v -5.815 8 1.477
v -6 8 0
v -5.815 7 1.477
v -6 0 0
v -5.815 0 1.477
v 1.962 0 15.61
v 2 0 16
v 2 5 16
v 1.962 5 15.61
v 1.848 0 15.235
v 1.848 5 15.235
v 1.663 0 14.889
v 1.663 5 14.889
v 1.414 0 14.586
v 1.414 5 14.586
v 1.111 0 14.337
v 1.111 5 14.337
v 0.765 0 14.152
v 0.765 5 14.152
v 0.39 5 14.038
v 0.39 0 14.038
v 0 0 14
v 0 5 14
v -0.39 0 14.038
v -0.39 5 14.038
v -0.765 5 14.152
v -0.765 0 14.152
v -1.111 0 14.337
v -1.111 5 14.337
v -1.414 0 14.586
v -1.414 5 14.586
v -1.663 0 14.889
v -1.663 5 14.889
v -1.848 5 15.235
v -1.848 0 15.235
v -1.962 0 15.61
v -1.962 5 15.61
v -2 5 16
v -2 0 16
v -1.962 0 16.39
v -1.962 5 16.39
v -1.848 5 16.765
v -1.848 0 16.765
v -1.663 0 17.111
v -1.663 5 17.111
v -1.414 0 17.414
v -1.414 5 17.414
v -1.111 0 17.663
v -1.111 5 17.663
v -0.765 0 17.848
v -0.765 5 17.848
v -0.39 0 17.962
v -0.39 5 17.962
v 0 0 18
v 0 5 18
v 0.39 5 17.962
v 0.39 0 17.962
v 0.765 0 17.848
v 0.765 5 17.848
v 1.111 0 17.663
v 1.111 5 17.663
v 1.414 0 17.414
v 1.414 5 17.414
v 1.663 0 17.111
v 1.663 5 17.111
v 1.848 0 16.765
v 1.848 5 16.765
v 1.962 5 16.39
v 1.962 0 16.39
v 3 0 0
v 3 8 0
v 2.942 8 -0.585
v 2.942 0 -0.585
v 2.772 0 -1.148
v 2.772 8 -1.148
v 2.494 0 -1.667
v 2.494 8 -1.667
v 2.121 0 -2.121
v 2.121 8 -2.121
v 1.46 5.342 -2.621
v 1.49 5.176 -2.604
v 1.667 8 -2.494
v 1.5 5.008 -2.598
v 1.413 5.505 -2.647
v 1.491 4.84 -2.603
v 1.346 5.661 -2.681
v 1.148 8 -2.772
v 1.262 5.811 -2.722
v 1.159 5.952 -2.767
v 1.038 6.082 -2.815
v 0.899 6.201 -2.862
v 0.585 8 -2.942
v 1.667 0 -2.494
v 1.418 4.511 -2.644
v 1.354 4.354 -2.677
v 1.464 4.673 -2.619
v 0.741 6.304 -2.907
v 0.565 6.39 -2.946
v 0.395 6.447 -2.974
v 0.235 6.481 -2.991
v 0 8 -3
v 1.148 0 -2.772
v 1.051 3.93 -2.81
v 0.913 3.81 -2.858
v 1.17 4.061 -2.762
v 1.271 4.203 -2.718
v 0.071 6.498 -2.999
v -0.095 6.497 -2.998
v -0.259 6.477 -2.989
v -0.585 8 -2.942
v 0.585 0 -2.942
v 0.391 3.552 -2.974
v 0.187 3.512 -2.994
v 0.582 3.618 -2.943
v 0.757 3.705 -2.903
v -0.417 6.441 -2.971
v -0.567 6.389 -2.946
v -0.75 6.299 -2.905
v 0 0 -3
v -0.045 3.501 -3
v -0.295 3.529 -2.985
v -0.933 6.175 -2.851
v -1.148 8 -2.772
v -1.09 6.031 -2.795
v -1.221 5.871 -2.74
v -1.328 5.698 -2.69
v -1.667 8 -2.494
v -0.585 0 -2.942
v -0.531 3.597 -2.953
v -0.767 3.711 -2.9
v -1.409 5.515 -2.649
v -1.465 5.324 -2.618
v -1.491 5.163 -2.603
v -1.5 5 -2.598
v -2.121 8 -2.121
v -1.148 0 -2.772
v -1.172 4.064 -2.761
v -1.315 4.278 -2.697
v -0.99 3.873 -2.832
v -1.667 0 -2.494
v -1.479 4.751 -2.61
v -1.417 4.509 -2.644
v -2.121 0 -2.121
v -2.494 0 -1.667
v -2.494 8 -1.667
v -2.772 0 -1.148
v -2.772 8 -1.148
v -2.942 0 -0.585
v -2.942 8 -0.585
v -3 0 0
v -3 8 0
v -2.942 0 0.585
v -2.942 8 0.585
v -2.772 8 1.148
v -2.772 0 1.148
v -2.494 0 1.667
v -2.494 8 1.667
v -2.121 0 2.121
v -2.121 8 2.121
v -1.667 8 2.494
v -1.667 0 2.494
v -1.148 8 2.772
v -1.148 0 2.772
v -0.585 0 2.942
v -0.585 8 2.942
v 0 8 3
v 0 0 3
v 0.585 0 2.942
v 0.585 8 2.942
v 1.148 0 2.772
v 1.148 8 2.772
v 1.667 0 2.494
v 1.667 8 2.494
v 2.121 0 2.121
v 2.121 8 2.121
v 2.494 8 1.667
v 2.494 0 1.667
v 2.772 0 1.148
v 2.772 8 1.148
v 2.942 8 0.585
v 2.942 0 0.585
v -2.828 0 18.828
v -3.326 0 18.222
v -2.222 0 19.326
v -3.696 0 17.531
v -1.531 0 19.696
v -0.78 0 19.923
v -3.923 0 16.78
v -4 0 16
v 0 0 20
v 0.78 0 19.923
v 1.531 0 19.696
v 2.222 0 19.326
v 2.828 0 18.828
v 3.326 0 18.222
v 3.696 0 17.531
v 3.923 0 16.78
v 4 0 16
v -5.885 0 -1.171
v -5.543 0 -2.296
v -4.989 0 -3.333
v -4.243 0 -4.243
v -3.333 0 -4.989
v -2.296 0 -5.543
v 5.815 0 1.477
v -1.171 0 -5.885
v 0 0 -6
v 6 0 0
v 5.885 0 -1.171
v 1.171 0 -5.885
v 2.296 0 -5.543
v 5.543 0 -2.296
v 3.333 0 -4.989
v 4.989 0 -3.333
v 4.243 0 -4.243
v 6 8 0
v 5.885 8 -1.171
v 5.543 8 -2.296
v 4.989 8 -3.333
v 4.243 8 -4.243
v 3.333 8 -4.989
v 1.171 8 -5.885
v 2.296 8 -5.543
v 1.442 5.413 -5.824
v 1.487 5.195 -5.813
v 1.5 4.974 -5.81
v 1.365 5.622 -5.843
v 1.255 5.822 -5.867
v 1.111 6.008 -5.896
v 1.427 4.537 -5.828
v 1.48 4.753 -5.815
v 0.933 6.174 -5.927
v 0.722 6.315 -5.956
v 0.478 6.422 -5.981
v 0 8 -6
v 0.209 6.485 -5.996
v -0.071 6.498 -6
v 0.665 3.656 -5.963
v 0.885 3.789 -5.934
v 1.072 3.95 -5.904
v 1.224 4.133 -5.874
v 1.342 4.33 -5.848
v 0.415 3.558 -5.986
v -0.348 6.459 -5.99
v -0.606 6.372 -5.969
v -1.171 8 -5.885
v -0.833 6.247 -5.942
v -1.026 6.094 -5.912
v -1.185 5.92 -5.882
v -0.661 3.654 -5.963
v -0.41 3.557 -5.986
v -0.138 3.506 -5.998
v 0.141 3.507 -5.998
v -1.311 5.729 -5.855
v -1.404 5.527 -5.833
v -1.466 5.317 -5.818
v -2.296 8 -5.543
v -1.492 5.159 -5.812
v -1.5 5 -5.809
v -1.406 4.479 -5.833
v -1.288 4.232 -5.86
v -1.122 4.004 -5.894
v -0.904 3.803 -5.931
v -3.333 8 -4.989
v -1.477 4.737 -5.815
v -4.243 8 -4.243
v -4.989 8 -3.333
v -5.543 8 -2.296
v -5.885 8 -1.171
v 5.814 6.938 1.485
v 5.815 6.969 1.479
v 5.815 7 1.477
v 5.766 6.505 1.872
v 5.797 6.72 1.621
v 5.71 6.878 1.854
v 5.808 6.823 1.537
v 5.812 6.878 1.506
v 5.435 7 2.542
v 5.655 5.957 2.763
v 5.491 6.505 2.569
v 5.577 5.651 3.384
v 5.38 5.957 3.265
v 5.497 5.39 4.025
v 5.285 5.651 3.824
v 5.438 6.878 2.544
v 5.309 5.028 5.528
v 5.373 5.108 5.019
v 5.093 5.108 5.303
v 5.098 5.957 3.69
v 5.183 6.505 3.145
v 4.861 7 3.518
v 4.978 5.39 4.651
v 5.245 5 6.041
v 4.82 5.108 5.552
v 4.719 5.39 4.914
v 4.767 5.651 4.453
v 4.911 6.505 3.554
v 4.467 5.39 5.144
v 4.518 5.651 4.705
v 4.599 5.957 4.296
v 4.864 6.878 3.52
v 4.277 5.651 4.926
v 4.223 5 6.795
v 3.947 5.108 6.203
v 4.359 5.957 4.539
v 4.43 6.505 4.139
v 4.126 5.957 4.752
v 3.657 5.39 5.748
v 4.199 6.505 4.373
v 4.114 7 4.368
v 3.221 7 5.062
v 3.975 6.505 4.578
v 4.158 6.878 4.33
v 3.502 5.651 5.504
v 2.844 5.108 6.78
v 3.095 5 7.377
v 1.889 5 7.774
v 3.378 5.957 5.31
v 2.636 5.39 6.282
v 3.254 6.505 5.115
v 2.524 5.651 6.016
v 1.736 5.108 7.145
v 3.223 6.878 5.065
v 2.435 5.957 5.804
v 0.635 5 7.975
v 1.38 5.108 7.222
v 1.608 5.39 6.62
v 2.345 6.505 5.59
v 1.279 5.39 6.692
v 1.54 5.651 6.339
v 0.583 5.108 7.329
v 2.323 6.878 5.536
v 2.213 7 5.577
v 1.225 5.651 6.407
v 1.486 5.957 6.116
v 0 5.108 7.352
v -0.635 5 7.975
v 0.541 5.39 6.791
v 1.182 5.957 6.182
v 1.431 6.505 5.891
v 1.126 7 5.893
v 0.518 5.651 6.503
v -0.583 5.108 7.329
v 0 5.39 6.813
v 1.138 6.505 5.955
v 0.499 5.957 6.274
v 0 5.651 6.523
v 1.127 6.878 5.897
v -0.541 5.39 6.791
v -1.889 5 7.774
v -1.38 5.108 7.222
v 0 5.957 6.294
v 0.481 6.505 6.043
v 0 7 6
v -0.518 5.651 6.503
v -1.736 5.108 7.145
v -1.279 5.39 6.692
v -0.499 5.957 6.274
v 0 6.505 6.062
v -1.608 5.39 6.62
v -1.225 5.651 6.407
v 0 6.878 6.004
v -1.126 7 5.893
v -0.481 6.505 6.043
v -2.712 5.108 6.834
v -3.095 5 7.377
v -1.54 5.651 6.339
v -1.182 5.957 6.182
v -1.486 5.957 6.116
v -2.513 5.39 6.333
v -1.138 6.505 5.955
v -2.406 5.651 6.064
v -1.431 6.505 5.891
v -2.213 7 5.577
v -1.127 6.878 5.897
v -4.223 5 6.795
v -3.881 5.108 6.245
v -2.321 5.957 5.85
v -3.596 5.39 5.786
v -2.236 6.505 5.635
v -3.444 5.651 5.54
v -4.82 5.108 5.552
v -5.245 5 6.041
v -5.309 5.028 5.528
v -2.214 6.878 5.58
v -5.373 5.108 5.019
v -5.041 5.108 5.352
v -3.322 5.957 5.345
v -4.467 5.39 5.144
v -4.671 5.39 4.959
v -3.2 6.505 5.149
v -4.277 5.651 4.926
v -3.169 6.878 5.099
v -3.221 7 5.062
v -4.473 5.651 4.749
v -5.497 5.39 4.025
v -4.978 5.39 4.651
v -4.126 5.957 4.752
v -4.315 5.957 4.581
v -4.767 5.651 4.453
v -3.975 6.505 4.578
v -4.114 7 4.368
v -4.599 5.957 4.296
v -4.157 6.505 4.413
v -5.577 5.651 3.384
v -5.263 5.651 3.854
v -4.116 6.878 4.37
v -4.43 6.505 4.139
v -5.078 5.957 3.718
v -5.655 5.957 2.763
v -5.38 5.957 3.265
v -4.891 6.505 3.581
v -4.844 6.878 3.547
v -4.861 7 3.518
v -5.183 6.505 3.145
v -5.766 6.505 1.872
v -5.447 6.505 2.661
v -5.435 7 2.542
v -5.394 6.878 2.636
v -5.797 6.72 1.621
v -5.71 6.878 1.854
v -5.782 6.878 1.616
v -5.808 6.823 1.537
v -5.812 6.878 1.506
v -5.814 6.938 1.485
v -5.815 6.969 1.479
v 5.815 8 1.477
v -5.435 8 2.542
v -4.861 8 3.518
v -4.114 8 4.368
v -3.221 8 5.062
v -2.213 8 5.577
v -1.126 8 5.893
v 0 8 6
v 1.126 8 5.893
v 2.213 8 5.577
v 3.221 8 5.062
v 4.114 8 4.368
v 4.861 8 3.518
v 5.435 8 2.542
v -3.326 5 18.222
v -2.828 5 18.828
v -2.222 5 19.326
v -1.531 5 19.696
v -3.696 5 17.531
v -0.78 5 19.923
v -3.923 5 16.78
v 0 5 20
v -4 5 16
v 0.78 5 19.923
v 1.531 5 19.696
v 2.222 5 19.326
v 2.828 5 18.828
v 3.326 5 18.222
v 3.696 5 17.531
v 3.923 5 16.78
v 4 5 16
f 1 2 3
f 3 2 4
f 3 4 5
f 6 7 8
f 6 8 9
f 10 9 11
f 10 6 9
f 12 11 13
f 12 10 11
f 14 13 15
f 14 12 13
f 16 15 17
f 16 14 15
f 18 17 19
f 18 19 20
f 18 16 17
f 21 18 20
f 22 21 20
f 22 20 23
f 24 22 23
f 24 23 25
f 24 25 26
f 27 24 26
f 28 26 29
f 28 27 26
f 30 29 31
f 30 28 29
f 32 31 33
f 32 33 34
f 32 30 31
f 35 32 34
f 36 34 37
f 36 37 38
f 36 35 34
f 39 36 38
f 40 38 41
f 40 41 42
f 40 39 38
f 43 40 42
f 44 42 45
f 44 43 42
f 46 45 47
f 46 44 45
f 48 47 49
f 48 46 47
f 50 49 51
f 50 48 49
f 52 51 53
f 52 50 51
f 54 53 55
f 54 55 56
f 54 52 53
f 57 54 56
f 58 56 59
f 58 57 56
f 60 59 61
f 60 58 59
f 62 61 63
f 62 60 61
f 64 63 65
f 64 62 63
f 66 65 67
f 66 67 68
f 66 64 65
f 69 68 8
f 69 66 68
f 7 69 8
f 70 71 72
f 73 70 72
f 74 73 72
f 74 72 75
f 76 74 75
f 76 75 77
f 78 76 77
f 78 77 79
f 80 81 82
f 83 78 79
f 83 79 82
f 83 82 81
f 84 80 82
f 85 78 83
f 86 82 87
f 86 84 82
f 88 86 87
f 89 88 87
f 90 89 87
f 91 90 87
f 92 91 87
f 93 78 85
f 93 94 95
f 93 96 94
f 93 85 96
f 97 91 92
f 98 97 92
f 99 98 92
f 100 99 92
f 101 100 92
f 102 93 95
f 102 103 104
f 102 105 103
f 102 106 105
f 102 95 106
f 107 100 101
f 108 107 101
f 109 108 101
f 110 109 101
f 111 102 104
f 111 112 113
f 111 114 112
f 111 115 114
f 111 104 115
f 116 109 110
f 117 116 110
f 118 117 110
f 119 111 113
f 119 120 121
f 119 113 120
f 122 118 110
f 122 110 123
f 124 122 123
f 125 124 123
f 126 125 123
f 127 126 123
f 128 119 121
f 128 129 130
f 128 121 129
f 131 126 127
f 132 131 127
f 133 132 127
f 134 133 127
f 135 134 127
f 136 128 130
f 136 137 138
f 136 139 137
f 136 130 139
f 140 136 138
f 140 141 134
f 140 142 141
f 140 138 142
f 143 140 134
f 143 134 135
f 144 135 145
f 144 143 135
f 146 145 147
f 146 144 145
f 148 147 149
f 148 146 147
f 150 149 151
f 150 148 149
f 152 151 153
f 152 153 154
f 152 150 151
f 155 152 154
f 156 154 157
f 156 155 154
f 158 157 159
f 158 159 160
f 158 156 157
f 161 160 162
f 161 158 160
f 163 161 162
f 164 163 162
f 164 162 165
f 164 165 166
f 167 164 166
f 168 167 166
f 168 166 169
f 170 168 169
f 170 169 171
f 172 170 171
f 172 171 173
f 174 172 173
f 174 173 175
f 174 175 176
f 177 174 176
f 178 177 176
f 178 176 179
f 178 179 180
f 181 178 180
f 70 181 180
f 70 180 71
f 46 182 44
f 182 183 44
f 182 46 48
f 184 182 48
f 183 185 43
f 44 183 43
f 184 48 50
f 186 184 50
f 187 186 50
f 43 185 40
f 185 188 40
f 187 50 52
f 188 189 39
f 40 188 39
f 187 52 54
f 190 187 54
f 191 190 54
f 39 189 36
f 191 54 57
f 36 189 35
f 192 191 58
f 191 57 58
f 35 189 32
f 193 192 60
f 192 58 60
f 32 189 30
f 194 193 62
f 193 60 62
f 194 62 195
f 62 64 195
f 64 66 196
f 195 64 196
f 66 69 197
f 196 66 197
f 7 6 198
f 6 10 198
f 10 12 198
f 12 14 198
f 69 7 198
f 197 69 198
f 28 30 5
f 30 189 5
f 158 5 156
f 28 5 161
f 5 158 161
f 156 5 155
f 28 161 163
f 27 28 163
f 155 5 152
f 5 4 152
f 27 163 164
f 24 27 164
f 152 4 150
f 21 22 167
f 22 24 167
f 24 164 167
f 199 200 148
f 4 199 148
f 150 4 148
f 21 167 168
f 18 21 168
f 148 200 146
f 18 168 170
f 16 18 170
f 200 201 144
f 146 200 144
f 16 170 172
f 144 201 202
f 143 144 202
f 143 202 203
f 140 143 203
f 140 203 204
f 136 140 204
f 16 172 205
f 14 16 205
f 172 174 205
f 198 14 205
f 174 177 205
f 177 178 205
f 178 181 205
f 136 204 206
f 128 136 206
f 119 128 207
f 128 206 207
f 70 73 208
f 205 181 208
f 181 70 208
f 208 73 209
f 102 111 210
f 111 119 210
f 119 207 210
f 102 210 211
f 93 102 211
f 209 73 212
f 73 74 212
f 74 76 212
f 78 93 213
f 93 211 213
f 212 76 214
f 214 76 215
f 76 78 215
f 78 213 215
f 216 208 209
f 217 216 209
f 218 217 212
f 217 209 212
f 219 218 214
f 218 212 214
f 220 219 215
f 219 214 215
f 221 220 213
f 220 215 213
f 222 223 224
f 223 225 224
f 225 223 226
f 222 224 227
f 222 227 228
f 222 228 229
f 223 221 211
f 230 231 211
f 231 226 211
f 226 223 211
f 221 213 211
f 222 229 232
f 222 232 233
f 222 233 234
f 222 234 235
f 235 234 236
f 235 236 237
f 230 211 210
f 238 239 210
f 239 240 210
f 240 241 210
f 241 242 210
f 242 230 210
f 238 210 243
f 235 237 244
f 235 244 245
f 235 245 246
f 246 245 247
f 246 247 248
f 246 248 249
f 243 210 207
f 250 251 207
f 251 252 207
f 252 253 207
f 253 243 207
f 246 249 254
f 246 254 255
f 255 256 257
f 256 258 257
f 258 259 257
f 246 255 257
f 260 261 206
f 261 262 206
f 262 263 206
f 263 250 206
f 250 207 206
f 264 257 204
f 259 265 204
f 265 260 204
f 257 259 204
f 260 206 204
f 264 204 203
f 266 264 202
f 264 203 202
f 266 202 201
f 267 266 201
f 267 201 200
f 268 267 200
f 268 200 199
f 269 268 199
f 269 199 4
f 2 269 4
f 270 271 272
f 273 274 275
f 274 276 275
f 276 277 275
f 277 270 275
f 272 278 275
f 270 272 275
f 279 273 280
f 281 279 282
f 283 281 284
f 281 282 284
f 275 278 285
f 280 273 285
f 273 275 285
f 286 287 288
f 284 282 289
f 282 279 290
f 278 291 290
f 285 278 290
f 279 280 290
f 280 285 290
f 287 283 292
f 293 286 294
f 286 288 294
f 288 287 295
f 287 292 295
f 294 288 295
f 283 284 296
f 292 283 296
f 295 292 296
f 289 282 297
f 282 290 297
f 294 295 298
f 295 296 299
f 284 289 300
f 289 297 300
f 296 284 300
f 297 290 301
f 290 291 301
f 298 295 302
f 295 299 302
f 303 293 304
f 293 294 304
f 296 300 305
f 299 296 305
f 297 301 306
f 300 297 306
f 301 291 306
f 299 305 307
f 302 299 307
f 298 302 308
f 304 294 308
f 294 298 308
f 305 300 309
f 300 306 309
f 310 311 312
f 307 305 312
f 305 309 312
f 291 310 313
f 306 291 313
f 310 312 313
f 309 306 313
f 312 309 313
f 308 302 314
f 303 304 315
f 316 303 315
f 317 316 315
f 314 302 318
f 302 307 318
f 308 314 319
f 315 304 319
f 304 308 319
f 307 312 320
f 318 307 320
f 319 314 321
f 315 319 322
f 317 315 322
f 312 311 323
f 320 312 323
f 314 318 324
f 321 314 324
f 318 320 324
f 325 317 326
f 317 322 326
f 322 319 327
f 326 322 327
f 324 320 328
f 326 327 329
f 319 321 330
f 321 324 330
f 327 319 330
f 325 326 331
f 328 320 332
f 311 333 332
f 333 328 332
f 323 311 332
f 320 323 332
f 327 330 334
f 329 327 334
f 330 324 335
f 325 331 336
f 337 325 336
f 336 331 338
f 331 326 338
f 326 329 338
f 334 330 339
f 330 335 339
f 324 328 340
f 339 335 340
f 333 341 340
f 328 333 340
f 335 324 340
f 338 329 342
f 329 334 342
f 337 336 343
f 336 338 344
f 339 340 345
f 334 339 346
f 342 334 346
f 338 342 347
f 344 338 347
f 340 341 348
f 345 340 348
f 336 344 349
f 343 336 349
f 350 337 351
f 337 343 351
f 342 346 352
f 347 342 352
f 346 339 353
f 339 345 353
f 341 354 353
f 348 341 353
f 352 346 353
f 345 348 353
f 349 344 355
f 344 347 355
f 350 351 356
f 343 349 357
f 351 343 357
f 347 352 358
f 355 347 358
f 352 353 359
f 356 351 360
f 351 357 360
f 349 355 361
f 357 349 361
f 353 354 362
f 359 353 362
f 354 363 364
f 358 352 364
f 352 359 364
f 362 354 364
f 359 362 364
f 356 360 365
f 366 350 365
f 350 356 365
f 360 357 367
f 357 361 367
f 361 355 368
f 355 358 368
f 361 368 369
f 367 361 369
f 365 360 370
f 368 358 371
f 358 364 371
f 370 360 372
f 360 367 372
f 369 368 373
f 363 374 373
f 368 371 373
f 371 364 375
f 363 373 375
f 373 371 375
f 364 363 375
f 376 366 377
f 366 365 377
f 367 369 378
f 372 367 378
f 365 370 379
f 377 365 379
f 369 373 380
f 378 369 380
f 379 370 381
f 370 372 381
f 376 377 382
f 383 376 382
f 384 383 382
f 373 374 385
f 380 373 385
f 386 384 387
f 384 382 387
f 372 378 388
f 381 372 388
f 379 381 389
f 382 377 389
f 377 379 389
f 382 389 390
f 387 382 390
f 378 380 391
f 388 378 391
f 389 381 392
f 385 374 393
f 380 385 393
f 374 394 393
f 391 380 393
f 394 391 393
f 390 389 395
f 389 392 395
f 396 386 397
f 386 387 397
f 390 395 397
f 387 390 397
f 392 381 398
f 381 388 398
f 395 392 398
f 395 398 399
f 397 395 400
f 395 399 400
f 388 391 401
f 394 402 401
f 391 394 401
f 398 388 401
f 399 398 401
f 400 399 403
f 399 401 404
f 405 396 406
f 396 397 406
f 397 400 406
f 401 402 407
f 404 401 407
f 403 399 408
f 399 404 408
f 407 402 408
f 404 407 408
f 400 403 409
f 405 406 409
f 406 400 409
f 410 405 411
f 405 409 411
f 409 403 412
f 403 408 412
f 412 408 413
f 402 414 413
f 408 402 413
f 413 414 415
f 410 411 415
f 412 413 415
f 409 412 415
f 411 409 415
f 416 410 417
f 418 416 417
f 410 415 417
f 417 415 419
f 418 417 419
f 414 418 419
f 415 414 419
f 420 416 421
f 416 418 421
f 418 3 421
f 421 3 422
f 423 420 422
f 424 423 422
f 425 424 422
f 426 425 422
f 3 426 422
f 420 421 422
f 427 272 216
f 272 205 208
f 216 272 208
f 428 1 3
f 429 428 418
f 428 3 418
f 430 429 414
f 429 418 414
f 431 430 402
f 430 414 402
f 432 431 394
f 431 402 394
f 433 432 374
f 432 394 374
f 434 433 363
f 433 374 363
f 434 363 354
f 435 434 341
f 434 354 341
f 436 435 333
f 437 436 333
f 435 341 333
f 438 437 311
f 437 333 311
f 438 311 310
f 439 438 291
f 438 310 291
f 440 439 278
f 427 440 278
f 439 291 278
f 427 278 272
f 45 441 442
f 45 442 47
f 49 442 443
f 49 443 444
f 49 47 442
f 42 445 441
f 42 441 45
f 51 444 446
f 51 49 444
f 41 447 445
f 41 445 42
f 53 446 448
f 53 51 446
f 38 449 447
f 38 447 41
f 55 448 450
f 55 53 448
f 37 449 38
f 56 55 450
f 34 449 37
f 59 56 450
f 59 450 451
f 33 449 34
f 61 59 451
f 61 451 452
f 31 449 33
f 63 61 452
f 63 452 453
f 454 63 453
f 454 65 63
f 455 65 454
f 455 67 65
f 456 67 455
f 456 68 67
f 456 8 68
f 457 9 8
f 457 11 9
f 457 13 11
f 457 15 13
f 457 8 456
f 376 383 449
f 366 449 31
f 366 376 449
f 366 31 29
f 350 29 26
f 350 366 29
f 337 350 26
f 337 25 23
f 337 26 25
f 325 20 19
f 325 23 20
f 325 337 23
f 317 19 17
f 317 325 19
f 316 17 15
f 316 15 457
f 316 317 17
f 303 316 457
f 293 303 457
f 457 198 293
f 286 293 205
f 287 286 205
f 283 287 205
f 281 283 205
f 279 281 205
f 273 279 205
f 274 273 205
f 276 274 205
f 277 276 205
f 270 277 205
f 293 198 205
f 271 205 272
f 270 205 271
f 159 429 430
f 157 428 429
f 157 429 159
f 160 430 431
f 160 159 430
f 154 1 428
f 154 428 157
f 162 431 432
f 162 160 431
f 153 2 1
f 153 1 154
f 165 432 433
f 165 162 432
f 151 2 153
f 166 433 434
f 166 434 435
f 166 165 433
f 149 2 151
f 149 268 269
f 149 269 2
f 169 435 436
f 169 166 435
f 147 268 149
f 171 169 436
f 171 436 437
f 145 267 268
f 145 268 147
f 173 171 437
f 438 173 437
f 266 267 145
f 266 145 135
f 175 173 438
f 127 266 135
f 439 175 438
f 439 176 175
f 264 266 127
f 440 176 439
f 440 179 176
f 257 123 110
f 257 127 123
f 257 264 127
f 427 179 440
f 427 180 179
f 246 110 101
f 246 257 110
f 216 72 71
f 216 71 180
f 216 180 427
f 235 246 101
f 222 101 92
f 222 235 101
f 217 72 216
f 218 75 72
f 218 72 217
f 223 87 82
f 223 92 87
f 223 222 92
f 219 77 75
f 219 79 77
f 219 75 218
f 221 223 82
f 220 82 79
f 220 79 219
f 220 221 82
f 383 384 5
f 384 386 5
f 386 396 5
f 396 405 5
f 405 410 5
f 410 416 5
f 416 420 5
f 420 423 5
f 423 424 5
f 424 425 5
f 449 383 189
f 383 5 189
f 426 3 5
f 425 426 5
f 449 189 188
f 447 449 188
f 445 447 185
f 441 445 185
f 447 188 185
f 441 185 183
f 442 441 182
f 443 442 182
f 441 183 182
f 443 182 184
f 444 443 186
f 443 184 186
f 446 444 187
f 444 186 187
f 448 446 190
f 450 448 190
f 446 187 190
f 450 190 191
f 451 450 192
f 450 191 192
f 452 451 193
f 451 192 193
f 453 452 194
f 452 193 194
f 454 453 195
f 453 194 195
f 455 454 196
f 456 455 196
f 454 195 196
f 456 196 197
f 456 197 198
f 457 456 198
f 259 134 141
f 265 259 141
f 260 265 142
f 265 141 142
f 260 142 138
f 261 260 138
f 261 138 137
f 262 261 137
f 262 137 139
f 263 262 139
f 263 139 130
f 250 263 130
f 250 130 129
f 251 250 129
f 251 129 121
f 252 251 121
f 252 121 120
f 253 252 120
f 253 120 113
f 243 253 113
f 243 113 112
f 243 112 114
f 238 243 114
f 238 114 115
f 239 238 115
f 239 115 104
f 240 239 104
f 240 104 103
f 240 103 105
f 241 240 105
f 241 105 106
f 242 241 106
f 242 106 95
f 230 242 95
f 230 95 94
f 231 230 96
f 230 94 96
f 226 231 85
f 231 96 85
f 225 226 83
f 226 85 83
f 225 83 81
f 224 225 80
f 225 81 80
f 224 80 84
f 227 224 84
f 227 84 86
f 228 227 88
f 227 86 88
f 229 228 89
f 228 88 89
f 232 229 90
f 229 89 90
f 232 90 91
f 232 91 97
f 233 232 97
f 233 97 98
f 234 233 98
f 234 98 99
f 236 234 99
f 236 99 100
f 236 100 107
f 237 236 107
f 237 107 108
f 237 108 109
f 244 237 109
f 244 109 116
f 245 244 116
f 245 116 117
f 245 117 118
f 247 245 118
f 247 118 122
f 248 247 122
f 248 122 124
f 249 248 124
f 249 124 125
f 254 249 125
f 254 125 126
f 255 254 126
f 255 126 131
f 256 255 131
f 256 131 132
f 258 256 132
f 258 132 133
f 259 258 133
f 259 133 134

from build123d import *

# Parameters (mm, degrees)
SKETCH1_R             = 3
BOSS_EXTRUDE1_DEPTH   = 8
SKETCH1_3_R           = 2
BOSS_EXTRUDE2_DEPTH   = 5
FILLET1_R             = 2
M3_TAPPED_HOLE1_D     = 3
M3_TAPPED_HOLE1_DEPTH = 8.5
M3_TAPPED_HOLE1_TIP   = 0.901290929


with BuildPart() as part:
    # Sketch1 → Boss-Extrude1 (new body)
    with BuildSketch(Plane(origin=(0, 0, 0), x_dir=(1, 0, 0), z_dir=(0, 1, 0))):
        with BuildLine():
            ThreePointArc((6, 0), (0, 6), (-6, 0))
            Line((-6, 0), (-5.815384615, -1.476923077))
            ThreePointArc((-5.815384615, -1.476923077), (0, -6), (5.815384615, -1.476923077))
            Line((5.815384615, -1.476923077), (6, 0))
        make_face()
        Circle(SKETCH1_R, mode=Mode.SUBTRACT)
    extrude(amount=BOSS_EXTRUDE1_DEPTH)

    # Sketch1<3> → Boss-Extrude2 (add)
    with BuildSketch(Plane(origin=(0, 0, 0), x_dir=(1, 0, 0), z_dir=(0, 1, 0))):
        with BuildLine():
            ThreePointArc((5.815384615, -1.476923077), (0, -6), (-5.815384615, -1.476923077))
            Line((-5.815384615, -1.476923077), (-4, -16))
            ThreePointArc((-4, -16), (0, -20), (4, -16))
            Line((4, -16), (5.815384615, -1.476923077))
        make_face()
        with Locations((0, -16)):
            Circle(SKETCH1_3_R, mode=Mode.SUBTRACT)
    extrude(amount=BOSS_EXTRUDE2_DEPTH)

    # Fillet1
    fillet1_edges = [part.edges().sort_by_distance(p)[0] for p in [
        (0, 5, 6),
    ]]
    fillet(fillet1_edges, radius=FILLET1_R)

    # M3 Tapped Hole1
    with Locations(Plane(origin=(0, 0, -8), x_dir=(1, 0, 0), z_dir=(0, 0, -1))):
        with Locations((0, -5)):
            Hole(M3_TAPPED_HOLE1_D / 2, depth=M3_TAPPED_HOLE1_DEPTH)
            with Locations((0, 0, -(M3_TAPPED_HOLE1_DEPTH + M3_TAPPED_HOLE1_TIP / 2))):  # 118° drill point
                Cone(0, M3_TAPPED_HOLE1_D / 2, M3_TAPPED_HOLE1_TIP, mode=Mode.SUBTRACT)


solid = part.part
